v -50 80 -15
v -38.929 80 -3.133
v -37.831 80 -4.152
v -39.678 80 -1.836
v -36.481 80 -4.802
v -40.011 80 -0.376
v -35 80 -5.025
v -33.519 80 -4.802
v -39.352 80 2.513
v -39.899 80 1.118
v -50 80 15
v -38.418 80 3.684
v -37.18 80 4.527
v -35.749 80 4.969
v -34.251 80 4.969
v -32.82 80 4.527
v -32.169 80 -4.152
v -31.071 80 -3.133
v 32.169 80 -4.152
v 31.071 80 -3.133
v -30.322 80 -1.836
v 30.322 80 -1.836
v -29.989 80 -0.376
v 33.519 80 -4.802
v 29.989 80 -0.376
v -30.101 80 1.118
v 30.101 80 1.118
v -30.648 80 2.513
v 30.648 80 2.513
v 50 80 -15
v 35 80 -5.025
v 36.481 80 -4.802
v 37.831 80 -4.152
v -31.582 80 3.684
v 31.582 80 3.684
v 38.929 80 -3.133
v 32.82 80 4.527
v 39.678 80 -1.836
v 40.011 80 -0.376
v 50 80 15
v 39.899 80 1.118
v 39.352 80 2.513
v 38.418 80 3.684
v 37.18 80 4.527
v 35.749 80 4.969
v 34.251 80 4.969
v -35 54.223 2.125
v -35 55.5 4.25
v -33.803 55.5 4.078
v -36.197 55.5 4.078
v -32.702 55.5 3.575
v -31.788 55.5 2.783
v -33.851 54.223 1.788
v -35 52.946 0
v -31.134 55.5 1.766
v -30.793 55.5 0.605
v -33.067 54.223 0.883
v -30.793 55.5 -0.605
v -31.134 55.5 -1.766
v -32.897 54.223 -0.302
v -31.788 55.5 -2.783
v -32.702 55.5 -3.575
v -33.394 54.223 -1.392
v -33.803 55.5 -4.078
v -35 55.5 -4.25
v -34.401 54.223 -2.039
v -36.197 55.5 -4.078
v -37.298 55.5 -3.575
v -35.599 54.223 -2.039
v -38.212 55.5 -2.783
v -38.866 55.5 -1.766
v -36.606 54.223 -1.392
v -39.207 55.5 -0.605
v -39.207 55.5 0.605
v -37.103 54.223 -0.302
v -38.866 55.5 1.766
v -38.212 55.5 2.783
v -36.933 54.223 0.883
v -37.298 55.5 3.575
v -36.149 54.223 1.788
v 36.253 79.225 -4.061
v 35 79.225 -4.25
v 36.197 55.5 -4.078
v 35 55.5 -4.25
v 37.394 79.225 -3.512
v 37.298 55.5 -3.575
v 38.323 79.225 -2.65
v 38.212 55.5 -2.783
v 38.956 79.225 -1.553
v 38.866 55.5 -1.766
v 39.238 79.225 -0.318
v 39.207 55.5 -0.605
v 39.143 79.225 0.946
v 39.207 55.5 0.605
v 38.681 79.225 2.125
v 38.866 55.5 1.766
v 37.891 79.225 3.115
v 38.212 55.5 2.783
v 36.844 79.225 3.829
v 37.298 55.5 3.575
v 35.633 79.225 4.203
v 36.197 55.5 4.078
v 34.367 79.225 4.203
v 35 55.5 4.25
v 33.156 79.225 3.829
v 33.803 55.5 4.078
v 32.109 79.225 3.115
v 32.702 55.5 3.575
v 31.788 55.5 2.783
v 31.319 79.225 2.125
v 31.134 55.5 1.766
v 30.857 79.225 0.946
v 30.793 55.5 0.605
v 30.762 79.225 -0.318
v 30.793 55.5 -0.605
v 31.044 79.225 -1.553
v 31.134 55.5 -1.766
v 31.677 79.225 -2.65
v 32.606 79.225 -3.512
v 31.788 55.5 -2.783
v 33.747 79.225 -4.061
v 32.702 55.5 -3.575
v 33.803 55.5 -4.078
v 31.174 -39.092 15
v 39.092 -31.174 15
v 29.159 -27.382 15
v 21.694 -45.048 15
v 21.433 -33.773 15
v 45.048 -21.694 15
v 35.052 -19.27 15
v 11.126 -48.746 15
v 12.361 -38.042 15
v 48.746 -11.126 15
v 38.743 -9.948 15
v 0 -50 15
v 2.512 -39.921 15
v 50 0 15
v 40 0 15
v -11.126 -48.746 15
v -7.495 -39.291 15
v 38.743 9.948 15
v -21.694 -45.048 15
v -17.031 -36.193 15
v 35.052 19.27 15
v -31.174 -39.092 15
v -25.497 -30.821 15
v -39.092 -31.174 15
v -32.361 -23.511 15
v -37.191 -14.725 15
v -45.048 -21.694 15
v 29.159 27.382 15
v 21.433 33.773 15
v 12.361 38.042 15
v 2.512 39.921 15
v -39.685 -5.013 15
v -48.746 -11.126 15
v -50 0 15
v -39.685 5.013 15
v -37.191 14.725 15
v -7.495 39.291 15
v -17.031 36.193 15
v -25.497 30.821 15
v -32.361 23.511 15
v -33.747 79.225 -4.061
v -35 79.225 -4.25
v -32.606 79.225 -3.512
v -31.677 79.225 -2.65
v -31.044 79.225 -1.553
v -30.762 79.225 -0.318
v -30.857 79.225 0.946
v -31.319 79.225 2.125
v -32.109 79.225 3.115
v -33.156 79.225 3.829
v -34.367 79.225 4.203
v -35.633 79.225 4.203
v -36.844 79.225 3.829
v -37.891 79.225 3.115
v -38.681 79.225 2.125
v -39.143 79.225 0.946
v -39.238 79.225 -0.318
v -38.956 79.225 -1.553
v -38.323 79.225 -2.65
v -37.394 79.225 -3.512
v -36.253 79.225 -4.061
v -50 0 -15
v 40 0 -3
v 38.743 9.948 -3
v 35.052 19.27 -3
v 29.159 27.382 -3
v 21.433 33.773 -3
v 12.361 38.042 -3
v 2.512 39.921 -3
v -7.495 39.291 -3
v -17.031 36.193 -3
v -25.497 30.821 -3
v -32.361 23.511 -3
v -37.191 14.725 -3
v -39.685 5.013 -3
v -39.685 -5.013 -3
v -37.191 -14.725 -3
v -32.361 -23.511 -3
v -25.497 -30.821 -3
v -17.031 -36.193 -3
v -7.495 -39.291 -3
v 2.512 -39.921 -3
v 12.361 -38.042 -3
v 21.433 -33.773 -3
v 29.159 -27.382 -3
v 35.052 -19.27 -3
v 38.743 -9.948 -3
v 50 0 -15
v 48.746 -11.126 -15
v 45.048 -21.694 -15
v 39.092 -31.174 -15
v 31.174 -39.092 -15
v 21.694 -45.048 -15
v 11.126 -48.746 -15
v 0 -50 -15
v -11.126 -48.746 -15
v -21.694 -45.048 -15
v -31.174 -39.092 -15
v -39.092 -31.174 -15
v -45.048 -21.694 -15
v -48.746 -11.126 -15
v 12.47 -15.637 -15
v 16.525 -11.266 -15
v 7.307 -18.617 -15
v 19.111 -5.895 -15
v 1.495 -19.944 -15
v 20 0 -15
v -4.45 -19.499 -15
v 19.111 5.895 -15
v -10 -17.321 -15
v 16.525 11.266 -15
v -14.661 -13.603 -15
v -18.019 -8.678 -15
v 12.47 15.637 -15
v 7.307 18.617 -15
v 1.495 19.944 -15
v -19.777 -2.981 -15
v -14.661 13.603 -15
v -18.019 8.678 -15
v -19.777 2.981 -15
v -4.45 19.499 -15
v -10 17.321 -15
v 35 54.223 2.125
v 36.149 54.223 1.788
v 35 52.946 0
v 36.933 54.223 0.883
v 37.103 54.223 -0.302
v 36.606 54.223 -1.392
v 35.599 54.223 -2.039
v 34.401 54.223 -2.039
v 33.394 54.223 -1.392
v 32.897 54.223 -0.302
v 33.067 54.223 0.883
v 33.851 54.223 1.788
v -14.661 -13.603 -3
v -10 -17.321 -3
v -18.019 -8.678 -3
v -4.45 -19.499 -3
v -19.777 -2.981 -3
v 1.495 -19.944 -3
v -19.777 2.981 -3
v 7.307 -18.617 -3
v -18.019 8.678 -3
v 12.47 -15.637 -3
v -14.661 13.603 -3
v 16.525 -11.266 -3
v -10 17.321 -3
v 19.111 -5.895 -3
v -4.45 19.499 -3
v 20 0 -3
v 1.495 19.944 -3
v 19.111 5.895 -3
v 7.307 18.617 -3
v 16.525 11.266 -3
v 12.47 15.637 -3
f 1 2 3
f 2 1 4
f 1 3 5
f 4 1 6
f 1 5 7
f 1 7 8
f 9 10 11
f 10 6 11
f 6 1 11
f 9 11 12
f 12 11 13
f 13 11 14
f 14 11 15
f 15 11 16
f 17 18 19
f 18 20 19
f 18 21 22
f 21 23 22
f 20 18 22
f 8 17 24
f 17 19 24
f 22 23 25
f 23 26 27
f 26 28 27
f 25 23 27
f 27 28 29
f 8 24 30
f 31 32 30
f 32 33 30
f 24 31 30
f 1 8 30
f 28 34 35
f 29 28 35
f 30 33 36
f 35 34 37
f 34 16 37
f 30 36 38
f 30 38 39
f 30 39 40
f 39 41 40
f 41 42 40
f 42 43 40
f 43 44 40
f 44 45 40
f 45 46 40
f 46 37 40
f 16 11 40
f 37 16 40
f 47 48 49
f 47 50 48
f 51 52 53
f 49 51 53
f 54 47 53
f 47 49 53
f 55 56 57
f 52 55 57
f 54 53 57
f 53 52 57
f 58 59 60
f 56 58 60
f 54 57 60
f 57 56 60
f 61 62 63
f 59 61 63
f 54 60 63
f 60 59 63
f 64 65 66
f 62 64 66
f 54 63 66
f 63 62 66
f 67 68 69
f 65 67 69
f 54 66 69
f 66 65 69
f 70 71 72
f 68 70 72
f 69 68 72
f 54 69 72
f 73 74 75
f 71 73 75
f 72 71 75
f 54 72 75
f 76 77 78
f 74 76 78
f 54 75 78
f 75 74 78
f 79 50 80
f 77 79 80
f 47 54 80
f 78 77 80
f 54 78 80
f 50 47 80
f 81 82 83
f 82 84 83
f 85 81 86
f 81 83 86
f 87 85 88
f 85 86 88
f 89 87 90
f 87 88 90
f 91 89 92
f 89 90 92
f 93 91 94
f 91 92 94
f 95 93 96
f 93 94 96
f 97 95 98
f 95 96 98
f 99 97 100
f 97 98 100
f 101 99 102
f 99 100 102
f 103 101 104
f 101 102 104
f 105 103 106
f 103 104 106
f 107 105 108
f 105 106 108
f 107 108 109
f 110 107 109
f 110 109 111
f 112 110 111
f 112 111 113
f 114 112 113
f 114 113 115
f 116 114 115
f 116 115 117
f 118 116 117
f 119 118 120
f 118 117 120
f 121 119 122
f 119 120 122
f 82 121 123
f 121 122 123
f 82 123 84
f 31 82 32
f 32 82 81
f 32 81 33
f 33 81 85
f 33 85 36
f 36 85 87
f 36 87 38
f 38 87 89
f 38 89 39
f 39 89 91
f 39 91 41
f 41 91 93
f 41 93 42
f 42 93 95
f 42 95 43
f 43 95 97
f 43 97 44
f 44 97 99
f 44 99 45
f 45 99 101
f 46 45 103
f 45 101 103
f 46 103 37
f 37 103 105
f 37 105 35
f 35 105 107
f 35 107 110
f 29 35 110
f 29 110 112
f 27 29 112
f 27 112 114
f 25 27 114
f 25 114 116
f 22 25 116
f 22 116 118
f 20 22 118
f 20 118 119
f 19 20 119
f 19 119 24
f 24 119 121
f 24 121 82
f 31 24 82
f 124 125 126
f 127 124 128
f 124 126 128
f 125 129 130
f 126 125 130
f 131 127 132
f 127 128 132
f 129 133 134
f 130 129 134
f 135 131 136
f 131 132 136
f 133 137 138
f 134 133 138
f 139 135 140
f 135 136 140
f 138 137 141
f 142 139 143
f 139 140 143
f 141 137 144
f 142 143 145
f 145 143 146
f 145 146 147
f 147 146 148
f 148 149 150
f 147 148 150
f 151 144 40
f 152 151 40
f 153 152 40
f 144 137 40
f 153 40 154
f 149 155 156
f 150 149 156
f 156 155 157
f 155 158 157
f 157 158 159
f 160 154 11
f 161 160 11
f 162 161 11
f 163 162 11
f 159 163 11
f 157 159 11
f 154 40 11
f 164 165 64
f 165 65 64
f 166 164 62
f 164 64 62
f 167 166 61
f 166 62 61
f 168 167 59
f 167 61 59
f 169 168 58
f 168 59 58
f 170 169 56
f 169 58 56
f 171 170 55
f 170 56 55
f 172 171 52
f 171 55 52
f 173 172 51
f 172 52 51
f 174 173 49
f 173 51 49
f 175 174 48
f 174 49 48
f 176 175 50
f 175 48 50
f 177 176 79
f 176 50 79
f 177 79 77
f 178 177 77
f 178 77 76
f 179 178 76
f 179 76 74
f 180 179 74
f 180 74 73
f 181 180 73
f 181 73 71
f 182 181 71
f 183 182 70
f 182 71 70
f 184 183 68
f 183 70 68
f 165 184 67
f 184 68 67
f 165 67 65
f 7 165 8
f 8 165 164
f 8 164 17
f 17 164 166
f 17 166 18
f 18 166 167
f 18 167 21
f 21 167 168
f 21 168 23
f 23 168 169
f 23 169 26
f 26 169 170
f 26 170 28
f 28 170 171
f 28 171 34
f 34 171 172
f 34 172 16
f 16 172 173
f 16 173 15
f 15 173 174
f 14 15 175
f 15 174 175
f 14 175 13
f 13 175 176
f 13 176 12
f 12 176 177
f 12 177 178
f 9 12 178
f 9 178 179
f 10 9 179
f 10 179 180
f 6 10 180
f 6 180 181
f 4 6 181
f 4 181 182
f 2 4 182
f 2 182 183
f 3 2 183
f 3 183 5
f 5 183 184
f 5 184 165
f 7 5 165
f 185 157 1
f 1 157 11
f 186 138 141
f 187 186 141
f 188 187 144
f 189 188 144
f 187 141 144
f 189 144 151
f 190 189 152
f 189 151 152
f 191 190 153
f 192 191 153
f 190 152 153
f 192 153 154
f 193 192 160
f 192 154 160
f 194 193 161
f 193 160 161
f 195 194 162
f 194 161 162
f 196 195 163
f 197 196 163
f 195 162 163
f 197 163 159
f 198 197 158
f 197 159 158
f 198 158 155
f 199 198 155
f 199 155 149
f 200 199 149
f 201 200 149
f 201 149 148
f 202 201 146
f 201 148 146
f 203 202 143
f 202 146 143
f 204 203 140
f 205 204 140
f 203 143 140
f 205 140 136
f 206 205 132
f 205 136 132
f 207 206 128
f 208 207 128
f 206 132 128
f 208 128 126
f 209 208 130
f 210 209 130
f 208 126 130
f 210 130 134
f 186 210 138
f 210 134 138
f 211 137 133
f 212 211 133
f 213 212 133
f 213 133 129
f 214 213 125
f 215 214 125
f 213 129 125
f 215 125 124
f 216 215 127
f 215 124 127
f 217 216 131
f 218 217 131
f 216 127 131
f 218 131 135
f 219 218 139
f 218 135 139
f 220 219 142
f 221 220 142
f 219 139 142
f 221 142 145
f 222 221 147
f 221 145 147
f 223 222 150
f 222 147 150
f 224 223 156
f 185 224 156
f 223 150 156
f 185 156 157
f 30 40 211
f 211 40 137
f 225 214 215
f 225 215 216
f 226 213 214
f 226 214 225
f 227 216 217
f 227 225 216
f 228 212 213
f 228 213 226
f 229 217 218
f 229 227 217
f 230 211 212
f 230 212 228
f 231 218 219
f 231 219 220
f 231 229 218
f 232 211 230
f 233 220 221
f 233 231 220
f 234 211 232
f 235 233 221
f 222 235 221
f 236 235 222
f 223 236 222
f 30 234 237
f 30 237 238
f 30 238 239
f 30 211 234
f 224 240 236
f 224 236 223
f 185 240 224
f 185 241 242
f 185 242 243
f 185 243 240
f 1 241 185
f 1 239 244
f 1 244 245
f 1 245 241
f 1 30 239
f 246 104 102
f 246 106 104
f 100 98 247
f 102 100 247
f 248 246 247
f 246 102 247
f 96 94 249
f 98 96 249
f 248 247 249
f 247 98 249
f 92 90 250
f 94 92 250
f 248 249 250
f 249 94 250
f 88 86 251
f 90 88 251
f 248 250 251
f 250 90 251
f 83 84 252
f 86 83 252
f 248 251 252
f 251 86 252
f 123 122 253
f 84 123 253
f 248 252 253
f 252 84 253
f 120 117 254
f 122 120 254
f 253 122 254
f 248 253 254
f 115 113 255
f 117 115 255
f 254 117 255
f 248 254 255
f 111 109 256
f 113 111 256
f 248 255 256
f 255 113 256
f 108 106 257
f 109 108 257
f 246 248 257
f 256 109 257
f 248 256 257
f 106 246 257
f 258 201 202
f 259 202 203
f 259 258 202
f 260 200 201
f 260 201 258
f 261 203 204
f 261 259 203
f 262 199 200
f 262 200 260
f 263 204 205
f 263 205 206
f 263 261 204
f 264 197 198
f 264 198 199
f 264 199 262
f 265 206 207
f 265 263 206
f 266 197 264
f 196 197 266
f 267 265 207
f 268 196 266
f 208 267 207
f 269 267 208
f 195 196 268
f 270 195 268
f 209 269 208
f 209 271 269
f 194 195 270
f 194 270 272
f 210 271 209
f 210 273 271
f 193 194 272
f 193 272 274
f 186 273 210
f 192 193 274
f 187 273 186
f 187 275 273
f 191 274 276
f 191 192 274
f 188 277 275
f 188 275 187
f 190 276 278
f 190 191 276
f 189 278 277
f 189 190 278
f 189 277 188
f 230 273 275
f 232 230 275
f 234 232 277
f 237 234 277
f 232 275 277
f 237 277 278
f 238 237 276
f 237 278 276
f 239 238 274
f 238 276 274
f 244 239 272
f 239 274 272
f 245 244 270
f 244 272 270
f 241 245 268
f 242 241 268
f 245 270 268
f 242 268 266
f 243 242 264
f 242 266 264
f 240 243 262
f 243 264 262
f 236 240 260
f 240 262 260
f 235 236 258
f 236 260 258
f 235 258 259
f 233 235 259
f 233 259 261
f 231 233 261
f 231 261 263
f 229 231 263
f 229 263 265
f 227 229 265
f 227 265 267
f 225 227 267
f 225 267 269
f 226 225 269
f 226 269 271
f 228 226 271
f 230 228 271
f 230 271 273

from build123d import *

# Parameters (mm, degrees)
BOSS_EXTRUDE1_DEPTH          = 15
SKETCH4_R                    = 20
CUT_EXTRUDE1_DEPTH           = 30
SKETCH5_R                    = 40
CUT_EXTRUDE2_DEPTH           = 18
M10_TAPPED_HOLE1_D           = 8.5
M10_TAPPED_HOLE1_DEPTH       = 24.5
M10_TAPPED_HOLE1_CSINK_D     = 10.05
M10_TAPPED_HOLE1_CSINK_ANGLE = 90
M10_TAPPED_HOLE1_TIP         = 2.553657631


with BuildPart() as part:
    # Sketch2 → Boss-Extrude1 (new, symmetric)
    with BuildSketch(Plane.XY):
        with BuildLine():
            Line((-50, 0), (-50, 80))
            Line((-50, 80), (50, 80))
            Line((50, 80), (50, 0))
            ThreePointArc((50, 0), (0, -50), (-50, 0))
        make_face()
    extrude(amount=BOSS_EXTRUDE1_DEPTH, both=True)

    # Sketch4 → Cut-Extrude1 (cut)
    with BuildSketch(Plane.XY.offset(15)):
        Circle(SKETCH4_R)
    extrude(amount=-CUT_EXTRUDE1_DEPTH, mode=Mode.SUBTRACT)

    # Sketch5 → Cut-Extrude2 (cut)
    with BuildSketch(Plane.XY.offset(15)):
        Circle(SKETCH5_R)
    extrude(amount=-CUT_EXTRUDE2_DEPTH, mode=Mode.SUBTRACT)

    # M10 Tapped Hole1
    with Locations(Plane(origin=(-35, 80, 0), x_dir=(0, 0, 1), z_dir=(0, 1, 0))):
        with Locations((0, 0), (0, 70)):
            CounterSinkHole(M10_TAPPED_HOLE1_D / 2, M10_TAPPED_HOLE1_CSINK_D / 2, depth=M10_TAPPED_HOLE1_DEPTH, counter_sink_angle=M10_TAPPED_HOLE1_CSINK_ANGLE)
            with Locations((0, 0, -(M10_TAPPED_HOLE1_DEPTH + M10_TAPPED_HOLE1_TIP / 2))):  # 118° drill point
                Cone(0, M10_TAPPED_HOLE1_D / 2, M10_TAPPED_HOLE1_TIP, mode=Mode.SUBTRACT)


solid = part.part
